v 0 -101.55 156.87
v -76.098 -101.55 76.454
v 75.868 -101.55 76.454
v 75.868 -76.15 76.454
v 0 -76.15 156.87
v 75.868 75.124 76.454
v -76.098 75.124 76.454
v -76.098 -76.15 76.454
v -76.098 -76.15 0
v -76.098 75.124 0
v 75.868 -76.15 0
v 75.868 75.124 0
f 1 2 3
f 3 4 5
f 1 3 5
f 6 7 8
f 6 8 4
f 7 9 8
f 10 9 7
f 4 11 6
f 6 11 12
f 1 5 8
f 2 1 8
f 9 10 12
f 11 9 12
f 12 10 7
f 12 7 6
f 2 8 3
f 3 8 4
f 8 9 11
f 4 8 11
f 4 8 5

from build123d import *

# Parameters (mm, degrees)
F0_W     = 151.966393
F0_H     = 151.274591
F1_DEPTH = 76.454
F3_DEPTH = 25.4


with BuildPart() as f1:
    # F0 (on Top) → F1 (new body)
    with BuildSketch(Plane.XY):
        with Locations((-0.115298, -0.513137)):
            Rectangle(F0_W, F0_H)
    extrude(amount=F1_DEPTH)


with BuildPart() as f3:
    # F2 (on face) → F3 (new body)
    with BuildSketch(Plane.XZ.offset(76.150432)):
        Polygon((0, 156.86962), (-76.098494, 76.454), (75.867899, 76.454), align=None)
    extrude(amount=F3_DEPTH)


solid = Compound([f1.part, f3.part])
